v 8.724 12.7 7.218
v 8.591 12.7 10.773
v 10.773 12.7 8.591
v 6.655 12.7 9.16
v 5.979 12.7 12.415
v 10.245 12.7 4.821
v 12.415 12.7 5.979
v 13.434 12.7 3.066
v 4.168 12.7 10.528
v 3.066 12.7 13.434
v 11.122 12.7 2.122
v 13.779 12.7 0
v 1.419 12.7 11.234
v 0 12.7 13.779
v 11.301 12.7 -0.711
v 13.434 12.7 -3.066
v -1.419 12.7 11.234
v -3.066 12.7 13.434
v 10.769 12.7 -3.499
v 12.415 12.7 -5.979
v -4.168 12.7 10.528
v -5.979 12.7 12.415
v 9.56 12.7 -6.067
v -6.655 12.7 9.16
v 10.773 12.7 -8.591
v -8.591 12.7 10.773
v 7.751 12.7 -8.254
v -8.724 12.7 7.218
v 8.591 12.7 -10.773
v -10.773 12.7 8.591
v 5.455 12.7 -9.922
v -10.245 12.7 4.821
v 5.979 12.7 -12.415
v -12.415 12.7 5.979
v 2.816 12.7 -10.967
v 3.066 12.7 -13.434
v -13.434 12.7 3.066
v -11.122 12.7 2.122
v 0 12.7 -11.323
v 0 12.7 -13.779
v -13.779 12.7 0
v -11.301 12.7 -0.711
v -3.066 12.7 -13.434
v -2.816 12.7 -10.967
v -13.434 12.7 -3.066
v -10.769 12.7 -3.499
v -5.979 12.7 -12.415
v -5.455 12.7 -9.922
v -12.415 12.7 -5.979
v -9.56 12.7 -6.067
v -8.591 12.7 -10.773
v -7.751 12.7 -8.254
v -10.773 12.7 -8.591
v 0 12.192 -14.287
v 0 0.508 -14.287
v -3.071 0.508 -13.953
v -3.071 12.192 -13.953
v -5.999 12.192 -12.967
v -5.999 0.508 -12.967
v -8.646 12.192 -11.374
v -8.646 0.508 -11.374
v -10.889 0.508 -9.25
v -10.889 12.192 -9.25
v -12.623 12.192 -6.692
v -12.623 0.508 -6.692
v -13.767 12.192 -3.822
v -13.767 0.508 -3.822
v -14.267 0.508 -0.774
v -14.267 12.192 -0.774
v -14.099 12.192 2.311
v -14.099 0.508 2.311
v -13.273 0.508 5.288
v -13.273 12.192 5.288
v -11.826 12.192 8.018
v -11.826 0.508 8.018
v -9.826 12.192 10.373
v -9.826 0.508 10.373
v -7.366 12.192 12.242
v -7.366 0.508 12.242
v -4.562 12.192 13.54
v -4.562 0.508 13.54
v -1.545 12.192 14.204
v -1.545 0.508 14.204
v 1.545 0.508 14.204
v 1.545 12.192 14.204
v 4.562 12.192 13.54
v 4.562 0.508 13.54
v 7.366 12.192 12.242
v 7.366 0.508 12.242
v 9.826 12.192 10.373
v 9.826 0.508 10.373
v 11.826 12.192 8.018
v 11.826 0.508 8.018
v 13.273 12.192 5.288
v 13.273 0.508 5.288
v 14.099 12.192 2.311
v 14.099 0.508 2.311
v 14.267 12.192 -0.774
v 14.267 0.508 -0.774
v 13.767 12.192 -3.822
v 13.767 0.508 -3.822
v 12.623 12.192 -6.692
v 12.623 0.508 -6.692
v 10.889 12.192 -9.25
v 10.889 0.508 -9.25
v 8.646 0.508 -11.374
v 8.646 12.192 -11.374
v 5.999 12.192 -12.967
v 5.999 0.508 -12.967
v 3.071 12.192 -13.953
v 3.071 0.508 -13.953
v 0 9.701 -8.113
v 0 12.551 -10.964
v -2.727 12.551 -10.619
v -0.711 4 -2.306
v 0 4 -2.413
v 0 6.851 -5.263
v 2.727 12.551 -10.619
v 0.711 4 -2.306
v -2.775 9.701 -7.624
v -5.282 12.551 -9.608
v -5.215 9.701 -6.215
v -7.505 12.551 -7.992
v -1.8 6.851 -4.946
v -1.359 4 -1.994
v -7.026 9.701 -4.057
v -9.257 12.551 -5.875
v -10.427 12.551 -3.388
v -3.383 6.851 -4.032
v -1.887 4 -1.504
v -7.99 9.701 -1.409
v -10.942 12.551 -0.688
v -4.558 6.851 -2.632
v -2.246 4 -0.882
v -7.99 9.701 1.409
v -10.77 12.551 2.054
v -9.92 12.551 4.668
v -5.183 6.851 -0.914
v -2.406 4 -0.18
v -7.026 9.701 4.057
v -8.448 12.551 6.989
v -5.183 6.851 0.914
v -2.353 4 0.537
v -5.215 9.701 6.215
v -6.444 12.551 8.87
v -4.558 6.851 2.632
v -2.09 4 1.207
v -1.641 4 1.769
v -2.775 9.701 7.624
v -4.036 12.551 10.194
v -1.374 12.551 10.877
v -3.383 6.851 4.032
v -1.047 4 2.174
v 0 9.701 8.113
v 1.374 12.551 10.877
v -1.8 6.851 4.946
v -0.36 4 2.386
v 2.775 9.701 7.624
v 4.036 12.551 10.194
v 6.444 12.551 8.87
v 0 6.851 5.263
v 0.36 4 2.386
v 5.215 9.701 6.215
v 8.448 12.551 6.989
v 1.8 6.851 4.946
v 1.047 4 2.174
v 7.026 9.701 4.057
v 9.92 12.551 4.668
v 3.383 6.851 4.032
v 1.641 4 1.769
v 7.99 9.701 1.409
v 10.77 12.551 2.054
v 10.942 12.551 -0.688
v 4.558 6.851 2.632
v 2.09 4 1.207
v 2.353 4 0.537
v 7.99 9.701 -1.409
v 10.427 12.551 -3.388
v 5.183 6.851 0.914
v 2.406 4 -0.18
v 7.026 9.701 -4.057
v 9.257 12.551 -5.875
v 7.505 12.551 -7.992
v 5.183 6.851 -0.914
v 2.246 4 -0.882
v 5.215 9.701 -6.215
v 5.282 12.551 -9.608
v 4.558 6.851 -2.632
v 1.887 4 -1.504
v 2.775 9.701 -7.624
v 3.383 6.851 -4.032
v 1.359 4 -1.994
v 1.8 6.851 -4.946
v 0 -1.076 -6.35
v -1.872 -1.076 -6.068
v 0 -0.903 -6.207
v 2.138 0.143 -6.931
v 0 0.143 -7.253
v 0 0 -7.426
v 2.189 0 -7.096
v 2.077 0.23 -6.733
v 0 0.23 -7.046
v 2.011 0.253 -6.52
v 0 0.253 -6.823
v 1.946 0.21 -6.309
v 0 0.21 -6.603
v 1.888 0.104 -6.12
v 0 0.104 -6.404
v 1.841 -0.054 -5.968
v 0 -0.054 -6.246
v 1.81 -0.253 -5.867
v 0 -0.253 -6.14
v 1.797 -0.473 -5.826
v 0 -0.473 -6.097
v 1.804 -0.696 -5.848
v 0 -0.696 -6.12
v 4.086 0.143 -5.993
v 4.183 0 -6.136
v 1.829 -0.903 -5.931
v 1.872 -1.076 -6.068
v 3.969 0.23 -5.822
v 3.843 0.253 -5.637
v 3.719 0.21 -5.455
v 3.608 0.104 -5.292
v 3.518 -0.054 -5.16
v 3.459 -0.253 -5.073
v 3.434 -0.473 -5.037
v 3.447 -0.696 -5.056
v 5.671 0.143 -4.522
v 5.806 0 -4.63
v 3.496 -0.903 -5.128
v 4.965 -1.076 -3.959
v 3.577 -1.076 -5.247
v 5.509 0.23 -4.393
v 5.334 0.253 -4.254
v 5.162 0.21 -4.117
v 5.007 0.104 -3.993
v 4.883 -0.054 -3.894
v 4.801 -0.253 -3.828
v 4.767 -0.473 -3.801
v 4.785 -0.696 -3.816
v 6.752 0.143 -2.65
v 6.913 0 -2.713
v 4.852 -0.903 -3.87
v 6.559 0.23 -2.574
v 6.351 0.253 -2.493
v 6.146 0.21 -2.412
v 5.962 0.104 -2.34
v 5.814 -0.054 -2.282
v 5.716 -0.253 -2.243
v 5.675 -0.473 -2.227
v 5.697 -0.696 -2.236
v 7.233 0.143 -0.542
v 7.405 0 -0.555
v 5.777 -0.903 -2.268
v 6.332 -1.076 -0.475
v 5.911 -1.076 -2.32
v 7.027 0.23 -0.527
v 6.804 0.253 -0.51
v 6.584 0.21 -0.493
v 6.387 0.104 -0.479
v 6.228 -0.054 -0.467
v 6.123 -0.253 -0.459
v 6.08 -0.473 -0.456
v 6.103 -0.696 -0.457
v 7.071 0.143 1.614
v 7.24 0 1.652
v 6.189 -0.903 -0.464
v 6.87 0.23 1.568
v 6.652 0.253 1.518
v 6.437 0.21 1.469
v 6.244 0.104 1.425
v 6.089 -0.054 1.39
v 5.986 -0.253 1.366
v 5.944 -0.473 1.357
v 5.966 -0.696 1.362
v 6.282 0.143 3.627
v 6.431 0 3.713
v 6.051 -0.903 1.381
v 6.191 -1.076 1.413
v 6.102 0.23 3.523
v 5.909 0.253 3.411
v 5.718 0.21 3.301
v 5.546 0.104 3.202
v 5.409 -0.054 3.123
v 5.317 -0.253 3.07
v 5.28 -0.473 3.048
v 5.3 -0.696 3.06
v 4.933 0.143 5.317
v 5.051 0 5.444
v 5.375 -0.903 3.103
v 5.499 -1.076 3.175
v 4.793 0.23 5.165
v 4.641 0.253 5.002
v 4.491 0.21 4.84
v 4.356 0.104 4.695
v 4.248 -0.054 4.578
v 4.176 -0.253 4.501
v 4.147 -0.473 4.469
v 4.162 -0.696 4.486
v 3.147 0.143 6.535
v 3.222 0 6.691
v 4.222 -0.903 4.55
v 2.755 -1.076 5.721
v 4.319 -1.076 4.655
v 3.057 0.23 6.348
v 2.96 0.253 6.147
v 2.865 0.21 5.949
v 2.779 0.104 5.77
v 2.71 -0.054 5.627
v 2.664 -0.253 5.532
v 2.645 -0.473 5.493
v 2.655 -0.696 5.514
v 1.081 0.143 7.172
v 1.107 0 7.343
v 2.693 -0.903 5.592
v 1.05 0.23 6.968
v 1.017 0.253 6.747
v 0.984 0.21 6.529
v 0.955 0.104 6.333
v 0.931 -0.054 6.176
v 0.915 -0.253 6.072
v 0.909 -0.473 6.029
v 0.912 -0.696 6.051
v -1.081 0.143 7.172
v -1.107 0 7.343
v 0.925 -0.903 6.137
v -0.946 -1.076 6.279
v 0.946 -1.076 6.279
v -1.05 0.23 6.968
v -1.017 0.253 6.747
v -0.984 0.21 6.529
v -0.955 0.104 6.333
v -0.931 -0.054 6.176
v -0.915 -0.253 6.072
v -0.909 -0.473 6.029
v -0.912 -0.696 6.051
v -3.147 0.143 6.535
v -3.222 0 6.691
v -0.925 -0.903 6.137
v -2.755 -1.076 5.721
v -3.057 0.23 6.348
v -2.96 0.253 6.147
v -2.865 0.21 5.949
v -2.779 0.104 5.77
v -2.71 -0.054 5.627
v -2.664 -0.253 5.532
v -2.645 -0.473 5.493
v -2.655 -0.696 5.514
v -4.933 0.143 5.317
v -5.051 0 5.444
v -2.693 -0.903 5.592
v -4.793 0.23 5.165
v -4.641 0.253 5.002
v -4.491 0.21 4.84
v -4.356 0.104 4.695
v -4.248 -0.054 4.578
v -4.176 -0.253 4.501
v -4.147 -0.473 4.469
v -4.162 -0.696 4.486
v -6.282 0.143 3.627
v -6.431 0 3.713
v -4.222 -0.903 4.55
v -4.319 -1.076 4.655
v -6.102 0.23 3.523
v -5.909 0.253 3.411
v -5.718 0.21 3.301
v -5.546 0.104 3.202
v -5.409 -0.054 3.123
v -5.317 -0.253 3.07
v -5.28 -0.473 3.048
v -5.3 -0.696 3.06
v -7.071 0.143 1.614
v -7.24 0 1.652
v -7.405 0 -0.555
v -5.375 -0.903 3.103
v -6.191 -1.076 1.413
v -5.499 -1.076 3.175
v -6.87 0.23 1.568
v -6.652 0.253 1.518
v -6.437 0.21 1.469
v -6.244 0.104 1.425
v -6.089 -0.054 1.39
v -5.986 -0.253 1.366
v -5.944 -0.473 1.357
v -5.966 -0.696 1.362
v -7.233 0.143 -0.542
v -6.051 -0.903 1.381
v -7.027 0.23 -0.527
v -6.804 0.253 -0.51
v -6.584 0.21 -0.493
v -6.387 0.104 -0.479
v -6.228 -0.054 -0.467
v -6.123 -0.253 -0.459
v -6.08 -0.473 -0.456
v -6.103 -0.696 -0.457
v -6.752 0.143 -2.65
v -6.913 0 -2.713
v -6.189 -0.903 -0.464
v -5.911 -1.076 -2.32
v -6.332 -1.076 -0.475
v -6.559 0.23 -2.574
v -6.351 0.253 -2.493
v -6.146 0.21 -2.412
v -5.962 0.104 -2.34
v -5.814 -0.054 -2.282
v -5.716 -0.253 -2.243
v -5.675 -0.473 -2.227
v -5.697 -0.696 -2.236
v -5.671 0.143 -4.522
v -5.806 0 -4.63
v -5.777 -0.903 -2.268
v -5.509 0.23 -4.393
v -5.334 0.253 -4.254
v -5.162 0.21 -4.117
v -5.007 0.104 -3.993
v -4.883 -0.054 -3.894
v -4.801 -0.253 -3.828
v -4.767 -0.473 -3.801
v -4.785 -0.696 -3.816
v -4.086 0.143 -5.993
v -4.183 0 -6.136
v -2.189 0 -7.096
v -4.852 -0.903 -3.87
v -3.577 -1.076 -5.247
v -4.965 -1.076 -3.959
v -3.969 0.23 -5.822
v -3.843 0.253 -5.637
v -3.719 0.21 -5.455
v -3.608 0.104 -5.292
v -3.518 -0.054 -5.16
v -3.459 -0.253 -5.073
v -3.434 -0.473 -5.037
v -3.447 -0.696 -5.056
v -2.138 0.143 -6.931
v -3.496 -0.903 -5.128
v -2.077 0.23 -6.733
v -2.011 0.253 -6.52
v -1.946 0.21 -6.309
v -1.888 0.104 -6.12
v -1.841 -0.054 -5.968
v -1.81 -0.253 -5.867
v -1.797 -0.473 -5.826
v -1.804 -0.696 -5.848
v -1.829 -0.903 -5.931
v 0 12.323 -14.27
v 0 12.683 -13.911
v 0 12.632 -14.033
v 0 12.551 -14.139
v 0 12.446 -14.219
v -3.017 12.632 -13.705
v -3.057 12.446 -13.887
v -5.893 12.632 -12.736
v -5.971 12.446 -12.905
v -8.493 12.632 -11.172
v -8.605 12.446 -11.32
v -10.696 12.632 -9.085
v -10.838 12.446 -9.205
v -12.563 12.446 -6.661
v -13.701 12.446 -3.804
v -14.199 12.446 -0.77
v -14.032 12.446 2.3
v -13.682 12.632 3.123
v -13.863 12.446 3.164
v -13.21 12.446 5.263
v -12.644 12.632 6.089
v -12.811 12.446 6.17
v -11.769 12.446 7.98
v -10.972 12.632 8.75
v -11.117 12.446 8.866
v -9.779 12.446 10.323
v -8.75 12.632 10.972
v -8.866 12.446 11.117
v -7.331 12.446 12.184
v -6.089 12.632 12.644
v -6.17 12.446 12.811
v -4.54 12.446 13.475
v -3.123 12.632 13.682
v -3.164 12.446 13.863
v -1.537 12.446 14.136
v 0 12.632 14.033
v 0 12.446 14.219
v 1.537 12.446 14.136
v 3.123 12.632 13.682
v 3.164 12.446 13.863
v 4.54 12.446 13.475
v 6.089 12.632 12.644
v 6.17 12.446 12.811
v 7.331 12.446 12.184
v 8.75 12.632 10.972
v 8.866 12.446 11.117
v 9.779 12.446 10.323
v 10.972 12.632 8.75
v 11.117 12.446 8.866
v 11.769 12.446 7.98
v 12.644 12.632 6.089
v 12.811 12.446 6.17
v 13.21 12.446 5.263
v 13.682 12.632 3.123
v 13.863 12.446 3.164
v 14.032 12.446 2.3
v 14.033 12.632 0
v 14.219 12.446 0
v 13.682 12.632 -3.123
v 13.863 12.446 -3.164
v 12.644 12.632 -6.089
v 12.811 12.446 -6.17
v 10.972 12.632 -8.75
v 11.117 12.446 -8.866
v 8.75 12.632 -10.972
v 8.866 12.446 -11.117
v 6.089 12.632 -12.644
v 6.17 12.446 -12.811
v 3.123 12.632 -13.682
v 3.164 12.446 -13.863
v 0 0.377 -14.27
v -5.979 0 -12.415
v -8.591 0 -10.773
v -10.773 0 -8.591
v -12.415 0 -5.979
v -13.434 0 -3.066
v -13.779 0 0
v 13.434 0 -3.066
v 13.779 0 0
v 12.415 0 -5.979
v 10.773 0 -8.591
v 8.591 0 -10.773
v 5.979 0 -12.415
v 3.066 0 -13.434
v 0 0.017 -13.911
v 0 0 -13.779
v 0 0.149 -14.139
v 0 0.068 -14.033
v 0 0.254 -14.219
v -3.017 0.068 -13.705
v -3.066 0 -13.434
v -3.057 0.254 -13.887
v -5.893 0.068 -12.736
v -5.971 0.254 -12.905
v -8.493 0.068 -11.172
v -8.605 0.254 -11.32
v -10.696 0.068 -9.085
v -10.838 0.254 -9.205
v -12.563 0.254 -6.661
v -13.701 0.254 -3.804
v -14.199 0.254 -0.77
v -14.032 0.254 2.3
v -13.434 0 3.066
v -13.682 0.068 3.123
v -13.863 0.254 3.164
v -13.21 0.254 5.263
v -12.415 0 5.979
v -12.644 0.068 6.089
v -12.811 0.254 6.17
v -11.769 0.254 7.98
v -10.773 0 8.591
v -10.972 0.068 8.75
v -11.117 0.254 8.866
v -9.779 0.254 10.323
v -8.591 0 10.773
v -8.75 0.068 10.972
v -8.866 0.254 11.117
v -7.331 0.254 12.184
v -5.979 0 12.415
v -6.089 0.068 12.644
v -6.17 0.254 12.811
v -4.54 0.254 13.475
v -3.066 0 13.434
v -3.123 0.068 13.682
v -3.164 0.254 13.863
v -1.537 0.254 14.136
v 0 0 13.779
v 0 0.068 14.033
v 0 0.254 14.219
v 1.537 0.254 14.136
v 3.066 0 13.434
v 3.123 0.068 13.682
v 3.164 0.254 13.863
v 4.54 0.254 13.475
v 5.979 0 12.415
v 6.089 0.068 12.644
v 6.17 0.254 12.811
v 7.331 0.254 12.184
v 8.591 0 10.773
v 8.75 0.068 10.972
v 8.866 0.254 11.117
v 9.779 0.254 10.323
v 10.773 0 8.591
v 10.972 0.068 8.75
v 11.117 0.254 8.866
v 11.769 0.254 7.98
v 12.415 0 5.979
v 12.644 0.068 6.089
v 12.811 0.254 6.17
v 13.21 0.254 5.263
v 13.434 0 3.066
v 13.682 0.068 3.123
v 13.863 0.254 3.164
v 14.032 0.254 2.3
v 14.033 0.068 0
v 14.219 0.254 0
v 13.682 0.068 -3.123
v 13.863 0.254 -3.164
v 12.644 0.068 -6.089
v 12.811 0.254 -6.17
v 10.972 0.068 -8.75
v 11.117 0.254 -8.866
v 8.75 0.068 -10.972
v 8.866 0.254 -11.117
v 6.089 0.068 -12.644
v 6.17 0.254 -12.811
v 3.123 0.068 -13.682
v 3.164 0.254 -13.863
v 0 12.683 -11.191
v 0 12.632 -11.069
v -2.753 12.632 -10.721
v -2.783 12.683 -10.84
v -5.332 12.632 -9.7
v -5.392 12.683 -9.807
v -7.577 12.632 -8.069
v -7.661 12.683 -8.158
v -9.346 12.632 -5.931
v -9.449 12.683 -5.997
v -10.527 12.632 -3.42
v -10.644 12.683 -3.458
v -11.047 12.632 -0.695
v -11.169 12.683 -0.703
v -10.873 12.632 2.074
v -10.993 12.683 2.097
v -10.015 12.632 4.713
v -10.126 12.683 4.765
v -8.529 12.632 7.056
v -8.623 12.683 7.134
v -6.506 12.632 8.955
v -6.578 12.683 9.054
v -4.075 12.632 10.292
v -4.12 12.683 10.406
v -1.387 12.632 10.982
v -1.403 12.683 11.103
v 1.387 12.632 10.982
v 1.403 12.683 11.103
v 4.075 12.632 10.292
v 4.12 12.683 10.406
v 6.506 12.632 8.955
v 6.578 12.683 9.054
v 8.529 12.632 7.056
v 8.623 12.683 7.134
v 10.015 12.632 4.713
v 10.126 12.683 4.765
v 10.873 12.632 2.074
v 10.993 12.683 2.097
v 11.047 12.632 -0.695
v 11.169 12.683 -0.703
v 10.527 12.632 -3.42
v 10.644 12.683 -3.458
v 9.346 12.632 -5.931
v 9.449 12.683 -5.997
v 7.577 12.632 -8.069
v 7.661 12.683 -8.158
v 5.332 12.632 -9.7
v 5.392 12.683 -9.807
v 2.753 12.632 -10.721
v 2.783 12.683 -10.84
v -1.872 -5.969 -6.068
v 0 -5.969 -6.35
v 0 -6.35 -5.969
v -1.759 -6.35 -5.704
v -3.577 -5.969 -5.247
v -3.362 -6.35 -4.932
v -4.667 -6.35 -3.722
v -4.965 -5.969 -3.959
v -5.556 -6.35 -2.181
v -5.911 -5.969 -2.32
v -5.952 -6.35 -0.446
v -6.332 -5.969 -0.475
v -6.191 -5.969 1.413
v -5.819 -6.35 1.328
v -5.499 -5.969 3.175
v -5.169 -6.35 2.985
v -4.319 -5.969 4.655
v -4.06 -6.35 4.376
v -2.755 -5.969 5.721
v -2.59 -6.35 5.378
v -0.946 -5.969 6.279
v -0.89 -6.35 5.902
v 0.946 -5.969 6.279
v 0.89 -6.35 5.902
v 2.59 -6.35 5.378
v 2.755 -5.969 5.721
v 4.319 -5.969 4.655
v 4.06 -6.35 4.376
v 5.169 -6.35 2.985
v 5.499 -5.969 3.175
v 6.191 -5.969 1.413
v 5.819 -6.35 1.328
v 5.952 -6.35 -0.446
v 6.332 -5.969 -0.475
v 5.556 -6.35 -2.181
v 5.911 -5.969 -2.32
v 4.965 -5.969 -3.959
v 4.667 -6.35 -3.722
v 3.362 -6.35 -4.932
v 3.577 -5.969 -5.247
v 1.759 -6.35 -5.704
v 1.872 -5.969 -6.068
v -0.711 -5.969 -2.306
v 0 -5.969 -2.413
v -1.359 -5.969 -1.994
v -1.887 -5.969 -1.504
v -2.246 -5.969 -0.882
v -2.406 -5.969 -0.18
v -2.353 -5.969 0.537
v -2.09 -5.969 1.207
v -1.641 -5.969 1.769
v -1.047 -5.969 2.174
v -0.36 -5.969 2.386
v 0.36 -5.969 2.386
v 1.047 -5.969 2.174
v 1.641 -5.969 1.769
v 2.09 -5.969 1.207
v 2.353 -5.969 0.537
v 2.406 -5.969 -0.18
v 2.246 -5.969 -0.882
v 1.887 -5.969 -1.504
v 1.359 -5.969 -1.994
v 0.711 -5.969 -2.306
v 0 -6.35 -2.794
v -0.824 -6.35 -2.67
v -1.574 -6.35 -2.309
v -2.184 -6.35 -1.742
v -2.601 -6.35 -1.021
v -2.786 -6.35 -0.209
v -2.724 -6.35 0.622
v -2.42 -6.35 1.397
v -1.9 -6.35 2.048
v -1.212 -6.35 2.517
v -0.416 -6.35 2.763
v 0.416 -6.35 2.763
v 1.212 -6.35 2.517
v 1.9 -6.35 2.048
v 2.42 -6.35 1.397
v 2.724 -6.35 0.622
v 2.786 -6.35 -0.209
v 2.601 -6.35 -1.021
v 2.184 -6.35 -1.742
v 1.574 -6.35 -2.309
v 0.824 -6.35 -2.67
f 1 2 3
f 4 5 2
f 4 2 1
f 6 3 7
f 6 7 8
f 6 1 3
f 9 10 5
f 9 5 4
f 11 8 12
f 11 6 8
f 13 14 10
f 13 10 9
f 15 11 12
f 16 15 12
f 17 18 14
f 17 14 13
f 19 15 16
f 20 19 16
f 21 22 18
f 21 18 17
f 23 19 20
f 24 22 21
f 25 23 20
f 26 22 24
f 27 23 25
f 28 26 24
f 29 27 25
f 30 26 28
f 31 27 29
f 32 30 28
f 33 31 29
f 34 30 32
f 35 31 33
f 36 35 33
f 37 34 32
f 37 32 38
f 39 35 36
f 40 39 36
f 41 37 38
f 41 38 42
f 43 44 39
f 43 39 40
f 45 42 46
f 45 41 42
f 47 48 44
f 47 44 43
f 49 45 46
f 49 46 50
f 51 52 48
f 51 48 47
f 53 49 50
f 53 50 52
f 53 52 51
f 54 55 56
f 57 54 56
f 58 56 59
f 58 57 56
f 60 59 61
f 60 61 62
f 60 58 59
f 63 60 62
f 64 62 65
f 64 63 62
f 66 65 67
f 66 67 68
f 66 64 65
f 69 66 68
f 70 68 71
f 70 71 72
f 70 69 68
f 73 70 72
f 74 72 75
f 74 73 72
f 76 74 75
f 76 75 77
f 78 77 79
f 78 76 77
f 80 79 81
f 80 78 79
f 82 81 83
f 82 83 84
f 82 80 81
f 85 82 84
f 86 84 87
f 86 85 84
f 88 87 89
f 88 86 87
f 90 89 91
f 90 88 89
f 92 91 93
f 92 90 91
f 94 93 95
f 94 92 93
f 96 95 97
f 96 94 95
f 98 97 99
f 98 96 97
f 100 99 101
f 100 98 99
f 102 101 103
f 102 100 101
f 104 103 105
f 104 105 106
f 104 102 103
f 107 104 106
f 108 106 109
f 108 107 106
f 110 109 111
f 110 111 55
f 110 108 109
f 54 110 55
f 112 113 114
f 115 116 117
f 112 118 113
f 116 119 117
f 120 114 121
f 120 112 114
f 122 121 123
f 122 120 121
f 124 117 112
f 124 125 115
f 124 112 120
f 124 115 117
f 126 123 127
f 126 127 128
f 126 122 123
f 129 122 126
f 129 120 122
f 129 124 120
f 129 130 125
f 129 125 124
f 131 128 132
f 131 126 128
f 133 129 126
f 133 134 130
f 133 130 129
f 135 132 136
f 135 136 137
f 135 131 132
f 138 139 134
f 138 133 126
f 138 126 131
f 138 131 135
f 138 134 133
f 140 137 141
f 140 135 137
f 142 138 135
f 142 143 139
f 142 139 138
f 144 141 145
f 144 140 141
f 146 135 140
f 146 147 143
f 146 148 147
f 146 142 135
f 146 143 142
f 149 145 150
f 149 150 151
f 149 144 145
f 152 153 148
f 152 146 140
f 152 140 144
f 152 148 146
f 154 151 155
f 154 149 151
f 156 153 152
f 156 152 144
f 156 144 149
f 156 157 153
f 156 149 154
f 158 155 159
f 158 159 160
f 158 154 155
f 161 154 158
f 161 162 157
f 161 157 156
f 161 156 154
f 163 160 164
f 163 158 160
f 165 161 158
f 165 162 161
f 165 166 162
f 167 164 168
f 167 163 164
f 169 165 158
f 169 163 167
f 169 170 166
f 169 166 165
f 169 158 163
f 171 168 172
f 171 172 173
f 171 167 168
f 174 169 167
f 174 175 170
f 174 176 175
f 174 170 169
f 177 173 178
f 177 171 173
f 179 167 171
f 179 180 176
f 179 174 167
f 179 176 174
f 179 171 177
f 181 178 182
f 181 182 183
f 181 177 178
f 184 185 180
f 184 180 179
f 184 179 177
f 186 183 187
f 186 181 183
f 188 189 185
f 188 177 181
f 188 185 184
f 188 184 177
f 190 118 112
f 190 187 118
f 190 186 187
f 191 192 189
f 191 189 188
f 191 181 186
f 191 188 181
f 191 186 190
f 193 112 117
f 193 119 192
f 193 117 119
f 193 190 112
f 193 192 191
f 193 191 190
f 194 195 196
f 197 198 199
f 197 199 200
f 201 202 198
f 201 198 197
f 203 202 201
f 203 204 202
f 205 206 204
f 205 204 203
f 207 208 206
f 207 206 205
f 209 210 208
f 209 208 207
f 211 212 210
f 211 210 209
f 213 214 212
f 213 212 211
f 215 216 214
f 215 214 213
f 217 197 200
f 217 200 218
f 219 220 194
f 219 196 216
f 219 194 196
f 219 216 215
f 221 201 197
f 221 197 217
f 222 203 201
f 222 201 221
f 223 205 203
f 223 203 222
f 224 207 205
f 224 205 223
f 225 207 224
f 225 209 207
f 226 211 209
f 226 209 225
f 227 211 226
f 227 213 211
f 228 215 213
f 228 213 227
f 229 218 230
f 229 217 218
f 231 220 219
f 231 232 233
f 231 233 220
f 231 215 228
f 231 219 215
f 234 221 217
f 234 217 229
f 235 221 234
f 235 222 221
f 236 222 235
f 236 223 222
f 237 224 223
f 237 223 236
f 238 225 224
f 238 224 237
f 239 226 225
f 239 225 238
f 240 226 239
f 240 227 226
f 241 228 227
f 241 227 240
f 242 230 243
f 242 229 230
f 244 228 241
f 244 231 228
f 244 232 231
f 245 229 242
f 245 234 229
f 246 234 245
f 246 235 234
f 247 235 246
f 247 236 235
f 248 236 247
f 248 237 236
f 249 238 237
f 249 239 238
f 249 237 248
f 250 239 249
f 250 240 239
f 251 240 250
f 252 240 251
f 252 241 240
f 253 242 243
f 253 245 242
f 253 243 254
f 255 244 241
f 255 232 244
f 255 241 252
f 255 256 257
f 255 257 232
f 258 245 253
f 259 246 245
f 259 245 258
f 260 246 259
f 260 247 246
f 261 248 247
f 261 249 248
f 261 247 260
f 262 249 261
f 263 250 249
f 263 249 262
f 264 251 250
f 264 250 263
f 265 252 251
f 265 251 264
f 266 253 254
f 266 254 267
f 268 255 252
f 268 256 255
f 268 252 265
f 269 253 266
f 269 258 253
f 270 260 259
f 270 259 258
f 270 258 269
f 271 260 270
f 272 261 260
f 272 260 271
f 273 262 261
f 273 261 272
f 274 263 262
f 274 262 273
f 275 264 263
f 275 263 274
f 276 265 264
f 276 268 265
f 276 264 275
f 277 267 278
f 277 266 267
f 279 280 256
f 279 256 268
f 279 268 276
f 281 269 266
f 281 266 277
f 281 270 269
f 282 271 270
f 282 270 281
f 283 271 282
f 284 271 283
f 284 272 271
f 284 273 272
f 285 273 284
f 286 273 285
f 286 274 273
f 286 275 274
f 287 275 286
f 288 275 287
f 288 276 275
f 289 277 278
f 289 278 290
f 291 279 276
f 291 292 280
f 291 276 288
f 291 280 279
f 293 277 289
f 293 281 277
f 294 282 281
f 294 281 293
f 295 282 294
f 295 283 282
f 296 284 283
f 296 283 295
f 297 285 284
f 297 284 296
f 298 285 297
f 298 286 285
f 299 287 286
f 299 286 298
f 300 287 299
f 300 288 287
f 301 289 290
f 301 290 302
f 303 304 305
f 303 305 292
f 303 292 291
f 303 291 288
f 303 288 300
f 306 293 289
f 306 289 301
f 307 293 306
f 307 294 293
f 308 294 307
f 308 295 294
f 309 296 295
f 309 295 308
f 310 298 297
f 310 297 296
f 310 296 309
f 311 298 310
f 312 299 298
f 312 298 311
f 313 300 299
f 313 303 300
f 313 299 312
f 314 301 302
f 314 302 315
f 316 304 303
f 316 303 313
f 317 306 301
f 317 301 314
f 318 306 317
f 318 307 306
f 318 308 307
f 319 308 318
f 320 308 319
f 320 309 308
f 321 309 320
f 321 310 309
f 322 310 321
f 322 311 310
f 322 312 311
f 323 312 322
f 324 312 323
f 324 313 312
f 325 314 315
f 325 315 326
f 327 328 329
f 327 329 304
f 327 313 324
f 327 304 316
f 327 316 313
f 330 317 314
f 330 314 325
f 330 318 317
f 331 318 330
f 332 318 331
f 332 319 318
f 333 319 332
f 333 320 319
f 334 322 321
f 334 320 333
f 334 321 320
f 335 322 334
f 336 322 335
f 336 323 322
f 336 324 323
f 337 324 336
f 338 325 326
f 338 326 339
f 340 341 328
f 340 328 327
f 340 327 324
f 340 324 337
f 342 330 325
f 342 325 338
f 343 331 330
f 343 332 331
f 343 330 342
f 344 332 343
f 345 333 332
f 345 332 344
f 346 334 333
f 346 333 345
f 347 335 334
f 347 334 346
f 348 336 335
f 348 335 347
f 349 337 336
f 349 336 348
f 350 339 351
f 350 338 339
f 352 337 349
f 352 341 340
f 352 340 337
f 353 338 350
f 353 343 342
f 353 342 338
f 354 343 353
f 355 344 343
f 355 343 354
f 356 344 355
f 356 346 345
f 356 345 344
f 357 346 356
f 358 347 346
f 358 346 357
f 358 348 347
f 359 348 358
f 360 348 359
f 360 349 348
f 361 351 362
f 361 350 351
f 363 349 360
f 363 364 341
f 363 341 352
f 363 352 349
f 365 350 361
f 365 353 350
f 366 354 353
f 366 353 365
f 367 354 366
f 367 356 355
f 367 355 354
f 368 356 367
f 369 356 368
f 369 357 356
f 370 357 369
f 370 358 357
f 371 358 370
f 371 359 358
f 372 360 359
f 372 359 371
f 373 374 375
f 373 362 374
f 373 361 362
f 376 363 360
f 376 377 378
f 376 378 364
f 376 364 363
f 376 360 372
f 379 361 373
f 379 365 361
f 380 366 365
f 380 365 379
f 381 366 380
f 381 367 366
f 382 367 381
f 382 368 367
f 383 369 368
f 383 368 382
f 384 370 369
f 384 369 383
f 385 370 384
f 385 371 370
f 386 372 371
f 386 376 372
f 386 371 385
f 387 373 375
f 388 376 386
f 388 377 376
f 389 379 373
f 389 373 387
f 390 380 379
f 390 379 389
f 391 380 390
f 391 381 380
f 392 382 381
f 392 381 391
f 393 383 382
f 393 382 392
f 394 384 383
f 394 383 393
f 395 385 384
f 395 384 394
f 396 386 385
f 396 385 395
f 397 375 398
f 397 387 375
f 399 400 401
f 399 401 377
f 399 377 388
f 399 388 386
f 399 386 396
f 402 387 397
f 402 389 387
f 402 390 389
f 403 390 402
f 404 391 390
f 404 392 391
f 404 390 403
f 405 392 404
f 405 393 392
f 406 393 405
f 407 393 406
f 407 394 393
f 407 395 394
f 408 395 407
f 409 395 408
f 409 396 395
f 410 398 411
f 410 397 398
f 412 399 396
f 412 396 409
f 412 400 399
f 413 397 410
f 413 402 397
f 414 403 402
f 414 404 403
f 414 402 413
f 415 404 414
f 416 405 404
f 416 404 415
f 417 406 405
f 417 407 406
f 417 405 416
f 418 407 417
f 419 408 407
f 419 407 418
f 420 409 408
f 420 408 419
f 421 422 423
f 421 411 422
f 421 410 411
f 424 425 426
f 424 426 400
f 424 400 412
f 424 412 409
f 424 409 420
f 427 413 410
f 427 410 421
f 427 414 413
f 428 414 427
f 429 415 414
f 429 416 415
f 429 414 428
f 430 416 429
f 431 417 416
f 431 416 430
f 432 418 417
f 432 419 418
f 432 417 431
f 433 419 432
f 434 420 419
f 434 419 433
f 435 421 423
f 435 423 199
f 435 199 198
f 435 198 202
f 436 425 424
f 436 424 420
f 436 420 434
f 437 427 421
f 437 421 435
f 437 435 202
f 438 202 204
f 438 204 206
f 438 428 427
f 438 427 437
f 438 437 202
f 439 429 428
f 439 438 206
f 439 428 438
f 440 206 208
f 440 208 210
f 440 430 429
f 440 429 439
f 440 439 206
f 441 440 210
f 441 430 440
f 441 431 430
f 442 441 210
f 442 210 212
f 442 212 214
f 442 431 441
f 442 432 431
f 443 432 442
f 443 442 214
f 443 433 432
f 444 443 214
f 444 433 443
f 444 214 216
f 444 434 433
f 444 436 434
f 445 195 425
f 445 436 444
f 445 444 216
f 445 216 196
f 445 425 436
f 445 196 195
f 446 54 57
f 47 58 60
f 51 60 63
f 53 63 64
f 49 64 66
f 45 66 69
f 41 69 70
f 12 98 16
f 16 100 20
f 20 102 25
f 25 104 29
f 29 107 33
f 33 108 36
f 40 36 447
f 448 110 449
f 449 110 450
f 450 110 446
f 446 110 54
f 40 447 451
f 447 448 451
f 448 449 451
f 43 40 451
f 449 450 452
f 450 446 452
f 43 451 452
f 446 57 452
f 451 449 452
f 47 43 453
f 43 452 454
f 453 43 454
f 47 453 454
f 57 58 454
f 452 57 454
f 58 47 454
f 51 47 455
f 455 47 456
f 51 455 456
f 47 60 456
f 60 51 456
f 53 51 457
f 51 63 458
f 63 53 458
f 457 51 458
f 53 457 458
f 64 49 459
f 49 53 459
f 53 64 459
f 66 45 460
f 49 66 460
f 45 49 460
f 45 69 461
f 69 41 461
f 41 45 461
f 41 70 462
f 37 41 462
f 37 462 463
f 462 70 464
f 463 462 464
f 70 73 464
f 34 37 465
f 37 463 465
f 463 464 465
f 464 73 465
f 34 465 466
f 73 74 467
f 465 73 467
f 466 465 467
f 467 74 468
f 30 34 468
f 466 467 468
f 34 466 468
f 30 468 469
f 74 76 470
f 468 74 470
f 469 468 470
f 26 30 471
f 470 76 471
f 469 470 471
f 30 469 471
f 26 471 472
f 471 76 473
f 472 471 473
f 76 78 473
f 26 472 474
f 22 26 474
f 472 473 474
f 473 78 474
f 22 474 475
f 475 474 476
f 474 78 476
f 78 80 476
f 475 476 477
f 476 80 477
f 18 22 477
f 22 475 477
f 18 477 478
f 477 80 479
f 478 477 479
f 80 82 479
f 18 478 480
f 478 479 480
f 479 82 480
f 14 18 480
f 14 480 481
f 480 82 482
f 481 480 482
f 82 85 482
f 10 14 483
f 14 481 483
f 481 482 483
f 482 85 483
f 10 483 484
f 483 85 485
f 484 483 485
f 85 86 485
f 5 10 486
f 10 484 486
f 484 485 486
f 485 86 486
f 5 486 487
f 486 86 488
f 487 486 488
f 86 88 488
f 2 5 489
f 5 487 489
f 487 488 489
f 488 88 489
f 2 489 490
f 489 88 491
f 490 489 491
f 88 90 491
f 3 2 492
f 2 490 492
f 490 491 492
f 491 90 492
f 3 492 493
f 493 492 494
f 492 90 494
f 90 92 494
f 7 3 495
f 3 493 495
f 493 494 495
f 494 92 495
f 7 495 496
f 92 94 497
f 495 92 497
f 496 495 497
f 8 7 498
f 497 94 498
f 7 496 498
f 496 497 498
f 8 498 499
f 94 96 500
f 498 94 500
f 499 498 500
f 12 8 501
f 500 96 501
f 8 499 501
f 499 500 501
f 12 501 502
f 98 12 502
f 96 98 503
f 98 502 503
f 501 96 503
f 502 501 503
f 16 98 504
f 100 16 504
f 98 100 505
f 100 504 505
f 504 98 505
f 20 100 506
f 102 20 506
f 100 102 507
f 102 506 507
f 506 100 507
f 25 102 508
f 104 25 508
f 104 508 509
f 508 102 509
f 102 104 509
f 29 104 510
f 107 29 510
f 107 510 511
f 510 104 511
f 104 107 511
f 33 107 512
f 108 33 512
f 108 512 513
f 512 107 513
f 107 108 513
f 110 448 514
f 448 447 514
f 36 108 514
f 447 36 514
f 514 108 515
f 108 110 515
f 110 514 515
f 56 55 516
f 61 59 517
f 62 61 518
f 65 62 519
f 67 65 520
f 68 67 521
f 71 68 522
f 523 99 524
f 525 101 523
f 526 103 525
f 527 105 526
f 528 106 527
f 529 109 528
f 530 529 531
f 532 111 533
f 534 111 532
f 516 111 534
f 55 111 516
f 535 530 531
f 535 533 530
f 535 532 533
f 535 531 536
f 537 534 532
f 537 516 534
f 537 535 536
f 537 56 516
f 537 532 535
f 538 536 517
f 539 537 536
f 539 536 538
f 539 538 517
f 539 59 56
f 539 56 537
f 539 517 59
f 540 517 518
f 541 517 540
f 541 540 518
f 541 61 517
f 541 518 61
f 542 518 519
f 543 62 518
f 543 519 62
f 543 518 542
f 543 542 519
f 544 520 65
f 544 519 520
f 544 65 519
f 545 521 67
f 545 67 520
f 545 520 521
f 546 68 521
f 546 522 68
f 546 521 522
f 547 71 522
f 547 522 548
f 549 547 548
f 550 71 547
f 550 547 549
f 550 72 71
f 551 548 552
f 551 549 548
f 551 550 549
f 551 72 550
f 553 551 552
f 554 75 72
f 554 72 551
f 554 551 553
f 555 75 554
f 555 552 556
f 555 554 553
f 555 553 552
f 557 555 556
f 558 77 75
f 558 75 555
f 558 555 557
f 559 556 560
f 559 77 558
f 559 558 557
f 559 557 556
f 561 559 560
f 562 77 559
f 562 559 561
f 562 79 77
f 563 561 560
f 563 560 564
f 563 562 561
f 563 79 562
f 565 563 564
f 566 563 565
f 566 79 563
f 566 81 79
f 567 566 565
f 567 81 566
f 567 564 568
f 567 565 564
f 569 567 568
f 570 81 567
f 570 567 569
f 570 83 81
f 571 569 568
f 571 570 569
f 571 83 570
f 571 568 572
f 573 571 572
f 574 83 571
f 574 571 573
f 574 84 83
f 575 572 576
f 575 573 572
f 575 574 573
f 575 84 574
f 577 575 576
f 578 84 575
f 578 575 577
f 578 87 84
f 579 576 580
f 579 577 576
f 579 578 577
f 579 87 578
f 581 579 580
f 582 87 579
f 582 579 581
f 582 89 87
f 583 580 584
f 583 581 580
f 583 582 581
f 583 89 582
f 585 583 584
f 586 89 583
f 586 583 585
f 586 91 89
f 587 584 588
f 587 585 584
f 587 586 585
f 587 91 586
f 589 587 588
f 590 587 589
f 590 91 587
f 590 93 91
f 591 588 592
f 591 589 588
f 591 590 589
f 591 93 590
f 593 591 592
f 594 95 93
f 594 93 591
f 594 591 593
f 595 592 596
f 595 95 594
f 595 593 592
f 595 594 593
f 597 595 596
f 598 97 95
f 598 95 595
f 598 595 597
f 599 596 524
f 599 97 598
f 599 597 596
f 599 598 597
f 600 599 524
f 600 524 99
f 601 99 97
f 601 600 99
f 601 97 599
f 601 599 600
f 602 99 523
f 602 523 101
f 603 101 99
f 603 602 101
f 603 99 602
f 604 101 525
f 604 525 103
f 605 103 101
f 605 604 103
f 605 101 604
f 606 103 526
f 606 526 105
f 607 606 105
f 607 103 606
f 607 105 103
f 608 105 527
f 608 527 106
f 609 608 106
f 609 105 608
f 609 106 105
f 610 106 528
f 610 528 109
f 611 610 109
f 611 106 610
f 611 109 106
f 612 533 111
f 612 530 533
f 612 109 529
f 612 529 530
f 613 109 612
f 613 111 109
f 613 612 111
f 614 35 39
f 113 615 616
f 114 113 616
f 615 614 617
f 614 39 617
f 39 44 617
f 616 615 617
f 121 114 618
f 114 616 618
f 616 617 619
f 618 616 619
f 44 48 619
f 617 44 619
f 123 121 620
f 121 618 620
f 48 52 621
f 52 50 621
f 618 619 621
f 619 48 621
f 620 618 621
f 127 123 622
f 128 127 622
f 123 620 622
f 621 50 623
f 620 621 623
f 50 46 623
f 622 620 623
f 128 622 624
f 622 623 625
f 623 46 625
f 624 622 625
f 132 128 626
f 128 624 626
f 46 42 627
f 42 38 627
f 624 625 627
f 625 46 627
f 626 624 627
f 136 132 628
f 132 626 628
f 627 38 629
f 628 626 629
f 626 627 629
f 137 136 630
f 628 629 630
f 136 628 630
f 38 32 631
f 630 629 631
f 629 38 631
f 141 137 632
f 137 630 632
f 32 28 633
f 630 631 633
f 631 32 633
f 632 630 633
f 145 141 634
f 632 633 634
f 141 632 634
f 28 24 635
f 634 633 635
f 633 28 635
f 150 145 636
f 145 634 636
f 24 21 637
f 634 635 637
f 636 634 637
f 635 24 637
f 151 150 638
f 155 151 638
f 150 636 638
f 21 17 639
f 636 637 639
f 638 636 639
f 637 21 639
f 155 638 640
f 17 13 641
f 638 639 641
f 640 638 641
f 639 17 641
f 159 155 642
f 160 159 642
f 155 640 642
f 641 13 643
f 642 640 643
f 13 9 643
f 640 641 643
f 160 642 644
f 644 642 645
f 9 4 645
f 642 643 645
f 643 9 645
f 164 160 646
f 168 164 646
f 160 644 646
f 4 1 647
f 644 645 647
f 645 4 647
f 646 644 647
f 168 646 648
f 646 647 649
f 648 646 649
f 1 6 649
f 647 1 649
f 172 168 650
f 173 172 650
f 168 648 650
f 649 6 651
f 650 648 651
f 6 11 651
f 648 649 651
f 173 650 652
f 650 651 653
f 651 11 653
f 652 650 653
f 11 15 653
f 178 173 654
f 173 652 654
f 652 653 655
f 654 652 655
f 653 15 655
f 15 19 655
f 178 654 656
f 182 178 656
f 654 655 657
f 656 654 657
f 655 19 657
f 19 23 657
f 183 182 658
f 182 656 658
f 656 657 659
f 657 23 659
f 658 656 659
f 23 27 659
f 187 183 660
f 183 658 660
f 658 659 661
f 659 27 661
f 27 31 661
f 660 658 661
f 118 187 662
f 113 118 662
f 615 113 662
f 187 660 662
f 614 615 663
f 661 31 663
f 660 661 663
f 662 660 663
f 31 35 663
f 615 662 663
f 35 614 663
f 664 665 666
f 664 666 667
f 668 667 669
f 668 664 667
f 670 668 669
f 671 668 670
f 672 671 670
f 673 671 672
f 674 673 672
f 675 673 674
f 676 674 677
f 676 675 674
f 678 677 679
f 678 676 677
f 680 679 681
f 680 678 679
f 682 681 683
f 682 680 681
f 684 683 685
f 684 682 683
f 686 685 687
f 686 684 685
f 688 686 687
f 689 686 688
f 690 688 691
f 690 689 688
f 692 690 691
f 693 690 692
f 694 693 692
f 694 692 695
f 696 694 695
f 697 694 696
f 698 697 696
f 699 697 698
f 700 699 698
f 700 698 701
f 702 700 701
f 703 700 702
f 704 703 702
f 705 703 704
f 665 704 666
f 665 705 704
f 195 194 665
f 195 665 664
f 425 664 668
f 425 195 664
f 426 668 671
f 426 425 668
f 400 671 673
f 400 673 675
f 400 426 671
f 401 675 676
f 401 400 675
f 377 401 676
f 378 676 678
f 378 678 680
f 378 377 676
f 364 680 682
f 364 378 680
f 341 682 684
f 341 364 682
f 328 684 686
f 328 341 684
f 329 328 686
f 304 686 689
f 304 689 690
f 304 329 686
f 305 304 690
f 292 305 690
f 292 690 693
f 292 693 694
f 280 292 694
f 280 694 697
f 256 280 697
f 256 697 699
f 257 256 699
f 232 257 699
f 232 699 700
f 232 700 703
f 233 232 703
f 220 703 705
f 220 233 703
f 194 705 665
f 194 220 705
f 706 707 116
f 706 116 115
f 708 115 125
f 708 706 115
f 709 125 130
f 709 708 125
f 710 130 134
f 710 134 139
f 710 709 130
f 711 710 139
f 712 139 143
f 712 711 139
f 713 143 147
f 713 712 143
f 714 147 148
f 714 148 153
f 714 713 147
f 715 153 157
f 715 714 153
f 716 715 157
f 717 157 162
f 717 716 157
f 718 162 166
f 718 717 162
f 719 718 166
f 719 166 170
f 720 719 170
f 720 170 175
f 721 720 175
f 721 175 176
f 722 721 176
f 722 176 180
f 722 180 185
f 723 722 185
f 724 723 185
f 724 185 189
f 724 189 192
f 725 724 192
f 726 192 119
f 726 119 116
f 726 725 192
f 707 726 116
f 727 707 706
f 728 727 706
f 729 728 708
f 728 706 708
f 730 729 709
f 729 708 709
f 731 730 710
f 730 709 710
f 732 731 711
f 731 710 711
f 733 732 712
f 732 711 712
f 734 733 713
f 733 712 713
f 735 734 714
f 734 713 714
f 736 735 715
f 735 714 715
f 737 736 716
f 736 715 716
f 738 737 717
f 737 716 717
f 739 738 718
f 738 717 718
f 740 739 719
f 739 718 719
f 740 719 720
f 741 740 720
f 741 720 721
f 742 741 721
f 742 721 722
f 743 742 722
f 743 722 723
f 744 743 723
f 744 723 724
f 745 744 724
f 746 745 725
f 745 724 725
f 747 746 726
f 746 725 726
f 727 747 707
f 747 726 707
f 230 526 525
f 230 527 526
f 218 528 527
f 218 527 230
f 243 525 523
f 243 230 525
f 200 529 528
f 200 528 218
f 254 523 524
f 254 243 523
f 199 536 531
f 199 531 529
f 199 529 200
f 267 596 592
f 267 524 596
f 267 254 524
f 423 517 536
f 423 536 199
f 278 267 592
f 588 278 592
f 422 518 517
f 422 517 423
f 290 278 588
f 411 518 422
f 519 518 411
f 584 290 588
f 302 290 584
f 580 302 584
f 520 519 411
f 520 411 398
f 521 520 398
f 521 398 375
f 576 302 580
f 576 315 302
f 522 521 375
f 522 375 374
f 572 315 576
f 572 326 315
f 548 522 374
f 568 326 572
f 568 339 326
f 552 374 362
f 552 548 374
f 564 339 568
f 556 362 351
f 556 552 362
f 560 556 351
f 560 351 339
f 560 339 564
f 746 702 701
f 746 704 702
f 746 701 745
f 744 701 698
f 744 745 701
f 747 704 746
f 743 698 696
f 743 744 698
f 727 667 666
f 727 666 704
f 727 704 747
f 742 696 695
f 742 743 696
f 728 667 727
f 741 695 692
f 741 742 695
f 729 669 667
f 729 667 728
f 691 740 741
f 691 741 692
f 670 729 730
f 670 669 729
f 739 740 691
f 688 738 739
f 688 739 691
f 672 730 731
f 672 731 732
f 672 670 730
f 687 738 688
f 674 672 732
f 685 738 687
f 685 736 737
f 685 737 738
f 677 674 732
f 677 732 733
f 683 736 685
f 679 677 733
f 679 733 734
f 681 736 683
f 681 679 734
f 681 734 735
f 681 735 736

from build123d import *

# Parameters (mm, degrees)
SKETCH2_R     = 0.762
CHAMFER1_SIZE = 0.381
FILLET1_R     = 0.508
CHAMFER2_SIZE = 0.381


with BuildPart() as part:
    # Sketch1 → Revolve1 (revolve)
    with BuildSketch(Plane.XY, mode=Mode.PRIVATE) as revolve1_sk:
        Polygon((2.413, -6.35), (6.35, -6.35), (6.35, 0), (14.2875, 0), (14.2875, 12.7), (11.1125, 12.7), (2.413, 4.0005), align=None)
    revolve(revolve1_sk.sketch.rotate(Axis((0, 0, 0), (0, 1, 0)), 90), axis=Axis((0, 0, 0), (0, 1, 0)))  # turned: the seam where the file's is

    # Sketch2 → Cut-Revolve1 (revolve, cut)
    with BuildSketch(Plane.XY, mode=Mode.PRIVATE) as cut_revolve1_sk:
        with Locations((6.858, -0.508)):
            Circle(SKETCH2_R)
    revolve(cut_revolve1_sk.sketch.rotate(Axis((0, 0, 0), (0, -1, 0)), 270), axis=Axis((0, 0, 0), (0, -1, 0)), mode=Mode.SUBTRACT)  # turned: the seam where the file's is

    # Chamfer1
    chamfer1_edges = [part.edges().sort_by_distance(p)[0] for p in [
        (0, -6.35, 2.413),
    ]]
    chamfer(chamfer1_edges, length=CHAMFER1_SIZE)

    # Fillet1
    fillet1_edges = [part.edges().sort_by_distance(p)[0] for p in [
        (0, 0, 14.2875),
        (0, 12.7, 14.2875),
        (0, 12.7, 11.1125),
    ]]
    fillet(fillet1_edges, radius=FILLET1_R)

    # Chamfer2
    chamfer2_edges = [part.edges().sort_by_distance(p)[0] for p in [
        (0, -6.35, 6.35),
    ]]
    chamfer(chamfer2_edges, length=CHAMFER2_SIZE)


solid = part.part
